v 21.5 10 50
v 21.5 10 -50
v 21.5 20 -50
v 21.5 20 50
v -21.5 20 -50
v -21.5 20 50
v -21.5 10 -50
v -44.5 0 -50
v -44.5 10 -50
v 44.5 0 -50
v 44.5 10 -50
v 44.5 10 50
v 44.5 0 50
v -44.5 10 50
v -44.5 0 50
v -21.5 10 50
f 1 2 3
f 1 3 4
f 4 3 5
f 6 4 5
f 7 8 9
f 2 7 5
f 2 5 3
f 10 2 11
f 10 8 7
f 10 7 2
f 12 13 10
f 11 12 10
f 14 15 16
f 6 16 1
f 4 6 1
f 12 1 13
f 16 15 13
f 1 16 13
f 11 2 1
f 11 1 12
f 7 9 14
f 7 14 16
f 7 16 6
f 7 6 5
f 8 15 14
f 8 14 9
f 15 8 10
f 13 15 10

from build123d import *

# Parameters (mm, degrees)
SKETCH_1_W      = 89
SKETCH_1_H      = 100
EXTRUDE_1_DEPTH = 10
EXTRUDE_2_DEPTH = 10


with BuildPart() as part:
    # Эскиз1 → Бобышка-Вытянуть1 (new body)
    with BuildSketch(Plane(origin=(0, 0, 0), x_dir=(1, 0, 0), z_dir=(0, 1, 0))):
        Rectangle(SKETCH_1_W, SKETCH_1_H)
    extrude(amount=EXTRUDE_1_DEPTH)

    # Эскиз2 → Бобышка-Вытянуть2 (add)
    with BuildSketch(Plane(origin=(0, 10, 0), x_dir=(1, 0, 0), z_dir=(0, 1, 0))):
        Polygon((0, 50), (21.5, 50), (21.5, -50), (-21.5, -50), (-21.5, 50), align=None)
    extrude(amount=EXTRUDE_2_DEPTH)


solid = part.part
